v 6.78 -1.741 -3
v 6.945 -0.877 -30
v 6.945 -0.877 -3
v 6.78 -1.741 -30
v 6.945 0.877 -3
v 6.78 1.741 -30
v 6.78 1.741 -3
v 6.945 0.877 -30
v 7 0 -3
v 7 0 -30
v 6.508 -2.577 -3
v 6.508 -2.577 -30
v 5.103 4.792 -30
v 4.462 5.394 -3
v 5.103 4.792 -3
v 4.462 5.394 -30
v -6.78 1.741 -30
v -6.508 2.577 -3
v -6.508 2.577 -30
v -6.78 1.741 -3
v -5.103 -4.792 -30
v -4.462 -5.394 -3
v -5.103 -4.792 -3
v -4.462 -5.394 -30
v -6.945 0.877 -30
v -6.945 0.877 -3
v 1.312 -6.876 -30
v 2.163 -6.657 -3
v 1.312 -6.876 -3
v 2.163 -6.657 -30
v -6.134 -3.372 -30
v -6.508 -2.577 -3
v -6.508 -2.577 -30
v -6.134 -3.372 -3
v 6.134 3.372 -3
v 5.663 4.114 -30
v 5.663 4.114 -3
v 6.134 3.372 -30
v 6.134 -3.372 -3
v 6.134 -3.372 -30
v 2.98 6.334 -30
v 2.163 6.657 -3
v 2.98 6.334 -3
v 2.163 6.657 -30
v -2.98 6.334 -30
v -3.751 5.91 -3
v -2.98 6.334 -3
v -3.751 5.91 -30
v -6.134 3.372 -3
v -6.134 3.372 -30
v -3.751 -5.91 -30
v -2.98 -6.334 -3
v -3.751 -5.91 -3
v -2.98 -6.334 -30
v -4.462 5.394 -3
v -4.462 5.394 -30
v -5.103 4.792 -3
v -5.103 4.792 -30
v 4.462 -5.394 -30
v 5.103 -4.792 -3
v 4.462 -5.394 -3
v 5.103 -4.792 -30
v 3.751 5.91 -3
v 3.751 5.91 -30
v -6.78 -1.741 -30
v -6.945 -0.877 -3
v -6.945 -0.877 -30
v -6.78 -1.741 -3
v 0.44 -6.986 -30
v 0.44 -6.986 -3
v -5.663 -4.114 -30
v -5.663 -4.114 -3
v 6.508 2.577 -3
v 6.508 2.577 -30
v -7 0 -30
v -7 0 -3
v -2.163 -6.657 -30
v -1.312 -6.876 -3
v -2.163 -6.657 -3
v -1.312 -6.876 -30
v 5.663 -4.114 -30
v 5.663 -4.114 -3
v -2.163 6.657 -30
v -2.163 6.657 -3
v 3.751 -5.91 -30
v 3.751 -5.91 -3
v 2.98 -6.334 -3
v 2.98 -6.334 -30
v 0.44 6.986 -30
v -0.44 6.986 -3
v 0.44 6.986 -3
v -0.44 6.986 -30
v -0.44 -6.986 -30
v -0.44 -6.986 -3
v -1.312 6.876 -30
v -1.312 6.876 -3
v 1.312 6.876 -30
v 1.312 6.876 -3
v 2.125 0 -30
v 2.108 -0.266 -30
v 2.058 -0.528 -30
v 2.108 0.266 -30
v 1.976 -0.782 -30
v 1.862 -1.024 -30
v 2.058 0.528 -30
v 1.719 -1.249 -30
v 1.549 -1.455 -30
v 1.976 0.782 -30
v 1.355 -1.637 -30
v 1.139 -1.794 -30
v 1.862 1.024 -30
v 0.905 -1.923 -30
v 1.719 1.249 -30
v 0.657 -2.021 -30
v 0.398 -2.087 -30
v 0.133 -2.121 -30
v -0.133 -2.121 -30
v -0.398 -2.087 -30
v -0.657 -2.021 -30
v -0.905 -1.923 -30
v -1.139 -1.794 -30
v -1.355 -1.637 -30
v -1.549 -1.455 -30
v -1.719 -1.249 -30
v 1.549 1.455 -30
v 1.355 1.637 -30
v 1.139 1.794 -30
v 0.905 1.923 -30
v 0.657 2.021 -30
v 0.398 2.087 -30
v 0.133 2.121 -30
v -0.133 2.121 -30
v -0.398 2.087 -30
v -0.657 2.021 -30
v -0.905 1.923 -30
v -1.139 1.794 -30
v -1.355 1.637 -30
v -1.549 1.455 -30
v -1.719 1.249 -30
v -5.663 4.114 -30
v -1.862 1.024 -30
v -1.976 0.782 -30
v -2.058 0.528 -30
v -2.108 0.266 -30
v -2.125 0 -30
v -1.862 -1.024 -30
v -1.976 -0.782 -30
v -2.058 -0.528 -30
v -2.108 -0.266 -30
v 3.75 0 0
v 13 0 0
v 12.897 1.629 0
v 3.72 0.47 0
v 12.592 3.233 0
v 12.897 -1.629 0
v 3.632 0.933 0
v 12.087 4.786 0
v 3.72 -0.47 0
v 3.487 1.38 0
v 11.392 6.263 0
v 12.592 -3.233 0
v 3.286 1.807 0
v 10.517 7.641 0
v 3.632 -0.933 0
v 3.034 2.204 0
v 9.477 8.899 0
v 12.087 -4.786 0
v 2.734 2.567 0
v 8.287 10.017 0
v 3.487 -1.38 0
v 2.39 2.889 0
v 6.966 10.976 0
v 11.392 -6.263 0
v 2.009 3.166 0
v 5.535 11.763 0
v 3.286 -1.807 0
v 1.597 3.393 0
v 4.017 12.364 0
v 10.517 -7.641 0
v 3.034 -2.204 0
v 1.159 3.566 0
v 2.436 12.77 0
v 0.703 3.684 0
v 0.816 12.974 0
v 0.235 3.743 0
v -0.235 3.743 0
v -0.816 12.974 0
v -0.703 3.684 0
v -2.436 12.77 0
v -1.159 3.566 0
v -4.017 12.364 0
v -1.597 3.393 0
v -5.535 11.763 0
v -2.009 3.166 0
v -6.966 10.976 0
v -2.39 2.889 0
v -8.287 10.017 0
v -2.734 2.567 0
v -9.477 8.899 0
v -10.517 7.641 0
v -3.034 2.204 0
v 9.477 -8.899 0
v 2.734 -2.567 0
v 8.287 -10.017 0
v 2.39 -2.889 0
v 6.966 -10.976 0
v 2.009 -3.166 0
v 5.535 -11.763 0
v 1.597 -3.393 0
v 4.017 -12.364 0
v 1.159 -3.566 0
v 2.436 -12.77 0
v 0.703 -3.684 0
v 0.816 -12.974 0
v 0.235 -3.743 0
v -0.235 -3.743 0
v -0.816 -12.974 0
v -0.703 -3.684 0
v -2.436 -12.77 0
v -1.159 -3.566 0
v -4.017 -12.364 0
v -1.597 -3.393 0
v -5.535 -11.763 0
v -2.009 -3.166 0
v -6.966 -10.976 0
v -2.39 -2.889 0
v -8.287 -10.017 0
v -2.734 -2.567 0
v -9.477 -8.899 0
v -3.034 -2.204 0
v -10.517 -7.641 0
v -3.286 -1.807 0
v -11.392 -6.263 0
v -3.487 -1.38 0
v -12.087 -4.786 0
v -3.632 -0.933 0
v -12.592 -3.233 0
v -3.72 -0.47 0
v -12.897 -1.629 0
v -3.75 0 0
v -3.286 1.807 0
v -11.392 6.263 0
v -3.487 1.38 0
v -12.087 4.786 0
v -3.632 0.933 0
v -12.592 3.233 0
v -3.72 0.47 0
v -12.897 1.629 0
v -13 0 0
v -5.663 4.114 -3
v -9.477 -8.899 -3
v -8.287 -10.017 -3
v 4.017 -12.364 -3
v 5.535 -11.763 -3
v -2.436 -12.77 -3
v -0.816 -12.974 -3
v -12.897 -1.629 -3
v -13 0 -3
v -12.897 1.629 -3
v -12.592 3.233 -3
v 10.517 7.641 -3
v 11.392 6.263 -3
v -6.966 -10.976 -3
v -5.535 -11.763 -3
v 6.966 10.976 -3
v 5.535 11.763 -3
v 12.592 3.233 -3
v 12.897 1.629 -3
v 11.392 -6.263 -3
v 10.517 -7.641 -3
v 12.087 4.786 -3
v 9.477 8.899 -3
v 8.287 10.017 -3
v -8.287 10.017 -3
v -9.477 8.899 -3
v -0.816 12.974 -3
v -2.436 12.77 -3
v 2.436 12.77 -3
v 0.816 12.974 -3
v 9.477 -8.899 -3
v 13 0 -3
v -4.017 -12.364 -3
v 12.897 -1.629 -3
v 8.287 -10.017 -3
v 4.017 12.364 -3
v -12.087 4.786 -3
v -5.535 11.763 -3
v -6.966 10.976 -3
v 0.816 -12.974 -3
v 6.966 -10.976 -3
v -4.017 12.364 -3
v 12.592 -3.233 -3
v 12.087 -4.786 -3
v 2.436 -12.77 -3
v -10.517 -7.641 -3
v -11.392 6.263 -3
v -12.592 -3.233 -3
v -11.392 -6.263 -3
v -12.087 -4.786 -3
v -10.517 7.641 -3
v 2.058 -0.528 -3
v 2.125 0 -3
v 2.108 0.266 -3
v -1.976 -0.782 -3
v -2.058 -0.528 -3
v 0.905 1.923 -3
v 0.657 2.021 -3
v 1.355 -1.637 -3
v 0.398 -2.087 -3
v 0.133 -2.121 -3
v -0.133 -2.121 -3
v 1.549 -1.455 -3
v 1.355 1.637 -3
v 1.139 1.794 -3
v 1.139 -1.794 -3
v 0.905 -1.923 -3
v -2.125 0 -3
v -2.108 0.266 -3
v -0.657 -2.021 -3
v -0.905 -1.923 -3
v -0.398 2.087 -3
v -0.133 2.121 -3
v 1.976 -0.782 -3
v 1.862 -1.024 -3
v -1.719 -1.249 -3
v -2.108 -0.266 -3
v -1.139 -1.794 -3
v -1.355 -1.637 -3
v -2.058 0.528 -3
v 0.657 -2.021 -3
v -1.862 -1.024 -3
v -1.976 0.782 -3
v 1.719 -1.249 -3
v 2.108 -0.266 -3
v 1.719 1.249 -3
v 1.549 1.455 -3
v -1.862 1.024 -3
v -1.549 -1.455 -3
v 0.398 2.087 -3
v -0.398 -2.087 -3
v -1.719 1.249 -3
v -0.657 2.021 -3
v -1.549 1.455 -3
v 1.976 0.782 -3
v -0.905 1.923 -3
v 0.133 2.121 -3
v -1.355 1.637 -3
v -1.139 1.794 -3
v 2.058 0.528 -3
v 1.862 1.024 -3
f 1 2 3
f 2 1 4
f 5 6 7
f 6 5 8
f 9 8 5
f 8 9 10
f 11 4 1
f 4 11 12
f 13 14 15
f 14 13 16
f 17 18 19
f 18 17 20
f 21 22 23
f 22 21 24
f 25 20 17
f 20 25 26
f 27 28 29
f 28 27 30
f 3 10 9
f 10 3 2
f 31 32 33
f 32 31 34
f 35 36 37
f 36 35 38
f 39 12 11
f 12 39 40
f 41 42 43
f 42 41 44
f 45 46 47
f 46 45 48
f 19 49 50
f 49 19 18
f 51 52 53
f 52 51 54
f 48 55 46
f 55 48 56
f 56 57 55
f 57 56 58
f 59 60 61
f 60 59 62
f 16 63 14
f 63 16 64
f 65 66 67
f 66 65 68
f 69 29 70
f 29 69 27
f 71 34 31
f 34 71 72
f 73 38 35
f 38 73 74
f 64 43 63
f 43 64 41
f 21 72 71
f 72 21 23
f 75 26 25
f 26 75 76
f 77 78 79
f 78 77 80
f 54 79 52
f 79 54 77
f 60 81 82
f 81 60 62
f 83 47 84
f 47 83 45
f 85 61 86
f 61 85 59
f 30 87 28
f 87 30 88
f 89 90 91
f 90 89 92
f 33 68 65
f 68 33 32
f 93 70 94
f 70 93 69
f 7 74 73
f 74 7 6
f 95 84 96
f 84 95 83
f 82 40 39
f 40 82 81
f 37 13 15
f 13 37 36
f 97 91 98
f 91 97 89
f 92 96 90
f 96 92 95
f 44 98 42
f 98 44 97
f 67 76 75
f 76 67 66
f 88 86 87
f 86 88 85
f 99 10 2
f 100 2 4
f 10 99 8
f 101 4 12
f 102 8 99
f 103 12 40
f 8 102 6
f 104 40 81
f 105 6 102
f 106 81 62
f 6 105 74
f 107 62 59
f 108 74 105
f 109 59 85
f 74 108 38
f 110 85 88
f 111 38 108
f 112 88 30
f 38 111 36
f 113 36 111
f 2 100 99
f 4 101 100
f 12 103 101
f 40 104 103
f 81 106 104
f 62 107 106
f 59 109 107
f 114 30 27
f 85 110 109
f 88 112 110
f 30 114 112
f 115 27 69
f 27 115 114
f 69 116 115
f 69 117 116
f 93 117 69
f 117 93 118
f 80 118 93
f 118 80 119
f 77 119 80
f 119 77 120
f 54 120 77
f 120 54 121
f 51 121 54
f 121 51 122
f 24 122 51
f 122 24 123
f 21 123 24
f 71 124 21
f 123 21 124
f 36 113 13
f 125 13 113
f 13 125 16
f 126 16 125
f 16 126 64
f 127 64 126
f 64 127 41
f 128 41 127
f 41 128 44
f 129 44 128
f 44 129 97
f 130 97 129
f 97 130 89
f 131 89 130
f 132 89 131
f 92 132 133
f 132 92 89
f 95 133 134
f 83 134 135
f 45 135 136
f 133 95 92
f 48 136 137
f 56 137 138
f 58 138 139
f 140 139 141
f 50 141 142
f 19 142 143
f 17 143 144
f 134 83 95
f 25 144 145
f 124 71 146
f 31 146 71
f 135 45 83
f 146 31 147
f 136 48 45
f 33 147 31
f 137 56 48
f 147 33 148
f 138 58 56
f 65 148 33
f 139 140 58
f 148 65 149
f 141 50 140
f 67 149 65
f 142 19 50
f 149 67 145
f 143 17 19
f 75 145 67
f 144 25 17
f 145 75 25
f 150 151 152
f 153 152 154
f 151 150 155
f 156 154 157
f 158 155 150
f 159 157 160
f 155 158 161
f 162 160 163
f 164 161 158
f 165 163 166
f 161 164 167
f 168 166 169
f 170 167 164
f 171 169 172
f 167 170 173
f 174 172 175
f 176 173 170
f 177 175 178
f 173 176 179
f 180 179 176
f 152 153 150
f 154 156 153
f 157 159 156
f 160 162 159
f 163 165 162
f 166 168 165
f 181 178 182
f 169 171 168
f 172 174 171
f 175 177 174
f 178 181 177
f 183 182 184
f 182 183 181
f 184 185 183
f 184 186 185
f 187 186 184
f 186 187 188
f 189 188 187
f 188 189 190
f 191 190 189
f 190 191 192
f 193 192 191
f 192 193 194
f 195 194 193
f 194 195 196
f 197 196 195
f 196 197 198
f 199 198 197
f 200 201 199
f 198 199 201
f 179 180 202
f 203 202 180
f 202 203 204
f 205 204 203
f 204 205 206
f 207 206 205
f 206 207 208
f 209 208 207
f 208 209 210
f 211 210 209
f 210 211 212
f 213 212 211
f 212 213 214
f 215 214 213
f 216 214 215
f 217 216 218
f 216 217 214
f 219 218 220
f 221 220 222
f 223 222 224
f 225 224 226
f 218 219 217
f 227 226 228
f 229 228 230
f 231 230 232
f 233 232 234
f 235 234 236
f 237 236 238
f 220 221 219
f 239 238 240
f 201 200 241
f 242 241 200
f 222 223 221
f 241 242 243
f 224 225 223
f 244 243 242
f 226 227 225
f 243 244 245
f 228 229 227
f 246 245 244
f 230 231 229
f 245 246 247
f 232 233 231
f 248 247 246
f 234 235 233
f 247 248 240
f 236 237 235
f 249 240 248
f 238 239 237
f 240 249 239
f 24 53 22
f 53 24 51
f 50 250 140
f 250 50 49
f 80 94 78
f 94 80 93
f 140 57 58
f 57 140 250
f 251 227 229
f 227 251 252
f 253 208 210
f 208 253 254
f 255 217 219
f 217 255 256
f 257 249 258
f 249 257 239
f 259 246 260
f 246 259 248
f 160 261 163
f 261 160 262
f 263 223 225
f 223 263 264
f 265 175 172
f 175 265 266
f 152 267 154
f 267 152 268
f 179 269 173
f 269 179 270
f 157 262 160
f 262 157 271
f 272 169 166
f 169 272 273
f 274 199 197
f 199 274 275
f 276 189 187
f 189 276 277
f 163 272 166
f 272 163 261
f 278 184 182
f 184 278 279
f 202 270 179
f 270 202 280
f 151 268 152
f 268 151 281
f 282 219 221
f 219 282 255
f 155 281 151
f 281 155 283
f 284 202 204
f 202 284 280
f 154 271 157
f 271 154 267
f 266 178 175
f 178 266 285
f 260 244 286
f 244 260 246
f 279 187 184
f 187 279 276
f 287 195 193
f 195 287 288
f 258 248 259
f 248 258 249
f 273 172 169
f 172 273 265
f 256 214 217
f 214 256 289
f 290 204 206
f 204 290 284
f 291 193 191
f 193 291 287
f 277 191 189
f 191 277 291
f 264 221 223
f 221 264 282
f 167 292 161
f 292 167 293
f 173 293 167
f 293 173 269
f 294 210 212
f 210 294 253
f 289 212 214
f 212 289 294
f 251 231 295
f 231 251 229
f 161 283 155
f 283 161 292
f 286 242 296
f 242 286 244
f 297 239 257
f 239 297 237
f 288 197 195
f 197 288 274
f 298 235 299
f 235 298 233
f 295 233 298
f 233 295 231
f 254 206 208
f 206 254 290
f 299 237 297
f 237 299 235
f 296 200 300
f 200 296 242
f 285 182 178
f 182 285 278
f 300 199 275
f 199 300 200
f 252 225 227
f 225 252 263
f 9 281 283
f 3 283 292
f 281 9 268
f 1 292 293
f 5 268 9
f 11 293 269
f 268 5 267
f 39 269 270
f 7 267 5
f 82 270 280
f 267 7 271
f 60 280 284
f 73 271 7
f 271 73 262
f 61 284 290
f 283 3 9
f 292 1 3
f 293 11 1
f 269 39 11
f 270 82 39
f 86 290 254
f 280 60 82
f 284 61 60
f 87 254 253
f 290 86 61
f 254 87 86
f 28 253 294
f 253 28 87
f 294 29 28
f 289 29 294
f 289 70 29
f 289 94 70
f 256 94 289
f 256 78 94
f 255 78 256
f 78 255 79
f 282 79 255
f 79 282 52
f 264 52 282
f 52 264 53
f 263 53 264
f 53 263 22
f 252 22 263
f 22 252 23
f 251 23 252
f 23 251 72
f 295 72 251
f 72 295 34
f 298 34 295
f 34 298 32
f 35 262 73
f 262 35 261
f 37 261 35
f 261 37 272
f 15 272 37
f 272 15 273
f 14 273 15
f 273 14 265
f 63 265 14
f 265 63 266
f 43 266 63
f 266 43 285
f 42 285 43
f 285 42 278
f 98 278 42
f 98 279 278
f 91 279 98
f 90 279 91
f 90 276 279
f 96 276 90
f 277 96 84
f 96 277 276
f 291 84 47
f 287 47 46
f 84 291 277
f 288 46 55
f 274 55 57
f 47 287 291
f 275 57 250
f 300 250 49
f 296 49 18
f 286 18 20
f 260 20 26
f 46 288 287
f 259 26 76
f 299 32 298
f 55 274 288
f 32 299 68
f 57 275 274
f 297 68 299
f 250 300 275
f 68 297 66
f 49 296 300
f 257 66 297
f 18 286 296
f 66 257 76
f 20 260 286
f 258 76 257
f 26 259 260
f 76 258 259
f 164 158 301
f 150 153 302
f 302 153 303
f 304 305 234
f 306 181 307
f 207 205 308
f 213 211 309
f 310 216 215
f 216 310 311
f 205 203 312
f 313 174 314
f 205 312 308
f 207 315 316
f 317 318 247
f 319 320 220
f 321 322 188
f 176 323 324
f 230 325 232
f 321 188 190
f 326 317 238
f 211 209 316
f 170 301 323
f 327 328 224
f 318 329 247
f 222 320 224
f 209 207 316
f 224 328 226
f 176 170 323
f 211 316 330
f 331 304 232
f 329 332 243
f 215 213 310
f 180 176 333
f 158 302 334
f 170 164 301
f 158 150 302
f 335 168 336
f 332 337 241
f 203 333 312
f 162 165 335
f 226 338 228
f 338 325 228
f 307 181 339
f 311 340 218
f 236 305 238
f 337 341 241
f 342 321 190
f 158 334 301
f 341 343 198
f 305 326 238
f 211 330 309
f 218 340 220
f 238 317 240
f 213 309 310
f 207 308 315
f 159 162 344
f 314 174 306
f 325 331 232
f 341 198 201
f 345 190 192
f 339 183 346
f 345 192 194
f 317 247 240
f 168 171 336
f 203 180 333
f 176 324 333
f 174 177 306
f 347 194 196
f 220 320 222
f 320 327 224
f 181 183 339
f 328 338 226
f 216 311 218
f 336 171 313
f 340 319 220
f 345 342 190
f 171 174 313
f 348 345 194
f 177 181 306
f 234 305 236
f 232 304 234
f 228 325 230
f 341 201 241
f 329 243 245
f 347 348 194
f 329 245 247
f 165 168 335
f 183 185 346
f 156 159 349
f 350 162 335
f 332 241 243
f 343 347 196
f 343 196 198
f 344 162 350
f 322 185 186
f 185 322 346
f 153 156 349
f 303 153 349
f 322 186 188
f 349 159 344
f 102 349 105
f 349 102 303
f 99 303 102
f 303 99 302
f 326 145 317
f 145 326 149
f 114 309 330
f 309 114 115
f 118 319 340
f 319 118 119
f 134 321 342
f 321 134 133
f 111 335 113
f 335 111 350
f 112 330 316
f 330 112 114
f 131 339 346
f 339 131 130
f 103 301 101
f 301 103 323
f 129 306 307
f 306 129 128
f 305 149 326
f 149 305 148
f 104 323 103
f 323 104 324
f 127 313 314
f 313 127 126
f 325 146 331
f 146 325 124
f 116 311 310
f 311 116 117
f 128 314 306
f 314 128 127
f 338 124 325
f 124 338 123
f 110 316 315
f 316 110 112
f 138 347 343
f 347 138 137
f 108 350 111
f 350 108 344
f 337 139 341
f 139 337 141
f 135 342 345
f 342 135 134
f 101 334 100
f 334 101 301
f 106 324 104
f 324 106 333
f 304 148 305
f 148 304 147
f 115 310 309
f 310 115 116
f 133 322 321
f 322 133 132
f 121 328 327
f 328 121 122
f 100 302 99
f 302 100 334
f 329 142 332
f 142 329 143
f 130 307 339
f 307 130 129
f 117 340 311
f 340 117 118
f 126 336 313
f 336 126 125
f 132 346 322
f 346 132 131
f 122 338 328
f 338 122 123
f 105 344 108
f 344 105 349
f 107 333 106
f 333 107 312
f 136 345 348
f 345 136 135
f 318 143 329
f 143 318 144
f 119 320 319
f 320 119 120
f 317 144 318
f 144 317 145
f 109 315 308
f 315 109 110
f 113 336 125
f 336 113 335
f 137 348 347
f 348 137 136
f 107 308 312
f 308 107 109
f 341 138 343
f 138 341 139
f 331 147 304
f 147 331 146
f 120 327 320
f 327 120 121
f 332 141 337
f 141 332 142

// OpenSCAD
$fn = 50;


difference() {
	union() {
		translate(v = [0, 0, -30.0000000000]) {
			cylinder(h = 30, r = 7.0000000000);
		}
		translate(v = [0, 0, -3.0000000000]) {
			cylinder(h = 3, r = 13.0000000000);
		}
	}
	union() {
		translate(v = [0, 0, 0]) {
			rotate(a = [0, 0, 0]) {
				difference() {
					union() {
						#translate(v = [0, 0, -30.0000000000]) {
							cylinder(h = 30, r = 2.0000000000);
						}
						#translate(v = [0, 0, -3]) {
							cylinder(h = 3, r = 7.0000000000, r1 = 2.1250000000, r2 = 3.7500000000);
						}
						#translate(v = [0, 0, -30.0000000000]) {
							cylinder(h = 30, r = 2.1250000000);
						}
						#translate(v = [0, 0, -30.0000000000]) {
							cylinder(h = 30, r = 2.0000000000);
						}
					}
					union();
				}
			}
		}
	}
}
